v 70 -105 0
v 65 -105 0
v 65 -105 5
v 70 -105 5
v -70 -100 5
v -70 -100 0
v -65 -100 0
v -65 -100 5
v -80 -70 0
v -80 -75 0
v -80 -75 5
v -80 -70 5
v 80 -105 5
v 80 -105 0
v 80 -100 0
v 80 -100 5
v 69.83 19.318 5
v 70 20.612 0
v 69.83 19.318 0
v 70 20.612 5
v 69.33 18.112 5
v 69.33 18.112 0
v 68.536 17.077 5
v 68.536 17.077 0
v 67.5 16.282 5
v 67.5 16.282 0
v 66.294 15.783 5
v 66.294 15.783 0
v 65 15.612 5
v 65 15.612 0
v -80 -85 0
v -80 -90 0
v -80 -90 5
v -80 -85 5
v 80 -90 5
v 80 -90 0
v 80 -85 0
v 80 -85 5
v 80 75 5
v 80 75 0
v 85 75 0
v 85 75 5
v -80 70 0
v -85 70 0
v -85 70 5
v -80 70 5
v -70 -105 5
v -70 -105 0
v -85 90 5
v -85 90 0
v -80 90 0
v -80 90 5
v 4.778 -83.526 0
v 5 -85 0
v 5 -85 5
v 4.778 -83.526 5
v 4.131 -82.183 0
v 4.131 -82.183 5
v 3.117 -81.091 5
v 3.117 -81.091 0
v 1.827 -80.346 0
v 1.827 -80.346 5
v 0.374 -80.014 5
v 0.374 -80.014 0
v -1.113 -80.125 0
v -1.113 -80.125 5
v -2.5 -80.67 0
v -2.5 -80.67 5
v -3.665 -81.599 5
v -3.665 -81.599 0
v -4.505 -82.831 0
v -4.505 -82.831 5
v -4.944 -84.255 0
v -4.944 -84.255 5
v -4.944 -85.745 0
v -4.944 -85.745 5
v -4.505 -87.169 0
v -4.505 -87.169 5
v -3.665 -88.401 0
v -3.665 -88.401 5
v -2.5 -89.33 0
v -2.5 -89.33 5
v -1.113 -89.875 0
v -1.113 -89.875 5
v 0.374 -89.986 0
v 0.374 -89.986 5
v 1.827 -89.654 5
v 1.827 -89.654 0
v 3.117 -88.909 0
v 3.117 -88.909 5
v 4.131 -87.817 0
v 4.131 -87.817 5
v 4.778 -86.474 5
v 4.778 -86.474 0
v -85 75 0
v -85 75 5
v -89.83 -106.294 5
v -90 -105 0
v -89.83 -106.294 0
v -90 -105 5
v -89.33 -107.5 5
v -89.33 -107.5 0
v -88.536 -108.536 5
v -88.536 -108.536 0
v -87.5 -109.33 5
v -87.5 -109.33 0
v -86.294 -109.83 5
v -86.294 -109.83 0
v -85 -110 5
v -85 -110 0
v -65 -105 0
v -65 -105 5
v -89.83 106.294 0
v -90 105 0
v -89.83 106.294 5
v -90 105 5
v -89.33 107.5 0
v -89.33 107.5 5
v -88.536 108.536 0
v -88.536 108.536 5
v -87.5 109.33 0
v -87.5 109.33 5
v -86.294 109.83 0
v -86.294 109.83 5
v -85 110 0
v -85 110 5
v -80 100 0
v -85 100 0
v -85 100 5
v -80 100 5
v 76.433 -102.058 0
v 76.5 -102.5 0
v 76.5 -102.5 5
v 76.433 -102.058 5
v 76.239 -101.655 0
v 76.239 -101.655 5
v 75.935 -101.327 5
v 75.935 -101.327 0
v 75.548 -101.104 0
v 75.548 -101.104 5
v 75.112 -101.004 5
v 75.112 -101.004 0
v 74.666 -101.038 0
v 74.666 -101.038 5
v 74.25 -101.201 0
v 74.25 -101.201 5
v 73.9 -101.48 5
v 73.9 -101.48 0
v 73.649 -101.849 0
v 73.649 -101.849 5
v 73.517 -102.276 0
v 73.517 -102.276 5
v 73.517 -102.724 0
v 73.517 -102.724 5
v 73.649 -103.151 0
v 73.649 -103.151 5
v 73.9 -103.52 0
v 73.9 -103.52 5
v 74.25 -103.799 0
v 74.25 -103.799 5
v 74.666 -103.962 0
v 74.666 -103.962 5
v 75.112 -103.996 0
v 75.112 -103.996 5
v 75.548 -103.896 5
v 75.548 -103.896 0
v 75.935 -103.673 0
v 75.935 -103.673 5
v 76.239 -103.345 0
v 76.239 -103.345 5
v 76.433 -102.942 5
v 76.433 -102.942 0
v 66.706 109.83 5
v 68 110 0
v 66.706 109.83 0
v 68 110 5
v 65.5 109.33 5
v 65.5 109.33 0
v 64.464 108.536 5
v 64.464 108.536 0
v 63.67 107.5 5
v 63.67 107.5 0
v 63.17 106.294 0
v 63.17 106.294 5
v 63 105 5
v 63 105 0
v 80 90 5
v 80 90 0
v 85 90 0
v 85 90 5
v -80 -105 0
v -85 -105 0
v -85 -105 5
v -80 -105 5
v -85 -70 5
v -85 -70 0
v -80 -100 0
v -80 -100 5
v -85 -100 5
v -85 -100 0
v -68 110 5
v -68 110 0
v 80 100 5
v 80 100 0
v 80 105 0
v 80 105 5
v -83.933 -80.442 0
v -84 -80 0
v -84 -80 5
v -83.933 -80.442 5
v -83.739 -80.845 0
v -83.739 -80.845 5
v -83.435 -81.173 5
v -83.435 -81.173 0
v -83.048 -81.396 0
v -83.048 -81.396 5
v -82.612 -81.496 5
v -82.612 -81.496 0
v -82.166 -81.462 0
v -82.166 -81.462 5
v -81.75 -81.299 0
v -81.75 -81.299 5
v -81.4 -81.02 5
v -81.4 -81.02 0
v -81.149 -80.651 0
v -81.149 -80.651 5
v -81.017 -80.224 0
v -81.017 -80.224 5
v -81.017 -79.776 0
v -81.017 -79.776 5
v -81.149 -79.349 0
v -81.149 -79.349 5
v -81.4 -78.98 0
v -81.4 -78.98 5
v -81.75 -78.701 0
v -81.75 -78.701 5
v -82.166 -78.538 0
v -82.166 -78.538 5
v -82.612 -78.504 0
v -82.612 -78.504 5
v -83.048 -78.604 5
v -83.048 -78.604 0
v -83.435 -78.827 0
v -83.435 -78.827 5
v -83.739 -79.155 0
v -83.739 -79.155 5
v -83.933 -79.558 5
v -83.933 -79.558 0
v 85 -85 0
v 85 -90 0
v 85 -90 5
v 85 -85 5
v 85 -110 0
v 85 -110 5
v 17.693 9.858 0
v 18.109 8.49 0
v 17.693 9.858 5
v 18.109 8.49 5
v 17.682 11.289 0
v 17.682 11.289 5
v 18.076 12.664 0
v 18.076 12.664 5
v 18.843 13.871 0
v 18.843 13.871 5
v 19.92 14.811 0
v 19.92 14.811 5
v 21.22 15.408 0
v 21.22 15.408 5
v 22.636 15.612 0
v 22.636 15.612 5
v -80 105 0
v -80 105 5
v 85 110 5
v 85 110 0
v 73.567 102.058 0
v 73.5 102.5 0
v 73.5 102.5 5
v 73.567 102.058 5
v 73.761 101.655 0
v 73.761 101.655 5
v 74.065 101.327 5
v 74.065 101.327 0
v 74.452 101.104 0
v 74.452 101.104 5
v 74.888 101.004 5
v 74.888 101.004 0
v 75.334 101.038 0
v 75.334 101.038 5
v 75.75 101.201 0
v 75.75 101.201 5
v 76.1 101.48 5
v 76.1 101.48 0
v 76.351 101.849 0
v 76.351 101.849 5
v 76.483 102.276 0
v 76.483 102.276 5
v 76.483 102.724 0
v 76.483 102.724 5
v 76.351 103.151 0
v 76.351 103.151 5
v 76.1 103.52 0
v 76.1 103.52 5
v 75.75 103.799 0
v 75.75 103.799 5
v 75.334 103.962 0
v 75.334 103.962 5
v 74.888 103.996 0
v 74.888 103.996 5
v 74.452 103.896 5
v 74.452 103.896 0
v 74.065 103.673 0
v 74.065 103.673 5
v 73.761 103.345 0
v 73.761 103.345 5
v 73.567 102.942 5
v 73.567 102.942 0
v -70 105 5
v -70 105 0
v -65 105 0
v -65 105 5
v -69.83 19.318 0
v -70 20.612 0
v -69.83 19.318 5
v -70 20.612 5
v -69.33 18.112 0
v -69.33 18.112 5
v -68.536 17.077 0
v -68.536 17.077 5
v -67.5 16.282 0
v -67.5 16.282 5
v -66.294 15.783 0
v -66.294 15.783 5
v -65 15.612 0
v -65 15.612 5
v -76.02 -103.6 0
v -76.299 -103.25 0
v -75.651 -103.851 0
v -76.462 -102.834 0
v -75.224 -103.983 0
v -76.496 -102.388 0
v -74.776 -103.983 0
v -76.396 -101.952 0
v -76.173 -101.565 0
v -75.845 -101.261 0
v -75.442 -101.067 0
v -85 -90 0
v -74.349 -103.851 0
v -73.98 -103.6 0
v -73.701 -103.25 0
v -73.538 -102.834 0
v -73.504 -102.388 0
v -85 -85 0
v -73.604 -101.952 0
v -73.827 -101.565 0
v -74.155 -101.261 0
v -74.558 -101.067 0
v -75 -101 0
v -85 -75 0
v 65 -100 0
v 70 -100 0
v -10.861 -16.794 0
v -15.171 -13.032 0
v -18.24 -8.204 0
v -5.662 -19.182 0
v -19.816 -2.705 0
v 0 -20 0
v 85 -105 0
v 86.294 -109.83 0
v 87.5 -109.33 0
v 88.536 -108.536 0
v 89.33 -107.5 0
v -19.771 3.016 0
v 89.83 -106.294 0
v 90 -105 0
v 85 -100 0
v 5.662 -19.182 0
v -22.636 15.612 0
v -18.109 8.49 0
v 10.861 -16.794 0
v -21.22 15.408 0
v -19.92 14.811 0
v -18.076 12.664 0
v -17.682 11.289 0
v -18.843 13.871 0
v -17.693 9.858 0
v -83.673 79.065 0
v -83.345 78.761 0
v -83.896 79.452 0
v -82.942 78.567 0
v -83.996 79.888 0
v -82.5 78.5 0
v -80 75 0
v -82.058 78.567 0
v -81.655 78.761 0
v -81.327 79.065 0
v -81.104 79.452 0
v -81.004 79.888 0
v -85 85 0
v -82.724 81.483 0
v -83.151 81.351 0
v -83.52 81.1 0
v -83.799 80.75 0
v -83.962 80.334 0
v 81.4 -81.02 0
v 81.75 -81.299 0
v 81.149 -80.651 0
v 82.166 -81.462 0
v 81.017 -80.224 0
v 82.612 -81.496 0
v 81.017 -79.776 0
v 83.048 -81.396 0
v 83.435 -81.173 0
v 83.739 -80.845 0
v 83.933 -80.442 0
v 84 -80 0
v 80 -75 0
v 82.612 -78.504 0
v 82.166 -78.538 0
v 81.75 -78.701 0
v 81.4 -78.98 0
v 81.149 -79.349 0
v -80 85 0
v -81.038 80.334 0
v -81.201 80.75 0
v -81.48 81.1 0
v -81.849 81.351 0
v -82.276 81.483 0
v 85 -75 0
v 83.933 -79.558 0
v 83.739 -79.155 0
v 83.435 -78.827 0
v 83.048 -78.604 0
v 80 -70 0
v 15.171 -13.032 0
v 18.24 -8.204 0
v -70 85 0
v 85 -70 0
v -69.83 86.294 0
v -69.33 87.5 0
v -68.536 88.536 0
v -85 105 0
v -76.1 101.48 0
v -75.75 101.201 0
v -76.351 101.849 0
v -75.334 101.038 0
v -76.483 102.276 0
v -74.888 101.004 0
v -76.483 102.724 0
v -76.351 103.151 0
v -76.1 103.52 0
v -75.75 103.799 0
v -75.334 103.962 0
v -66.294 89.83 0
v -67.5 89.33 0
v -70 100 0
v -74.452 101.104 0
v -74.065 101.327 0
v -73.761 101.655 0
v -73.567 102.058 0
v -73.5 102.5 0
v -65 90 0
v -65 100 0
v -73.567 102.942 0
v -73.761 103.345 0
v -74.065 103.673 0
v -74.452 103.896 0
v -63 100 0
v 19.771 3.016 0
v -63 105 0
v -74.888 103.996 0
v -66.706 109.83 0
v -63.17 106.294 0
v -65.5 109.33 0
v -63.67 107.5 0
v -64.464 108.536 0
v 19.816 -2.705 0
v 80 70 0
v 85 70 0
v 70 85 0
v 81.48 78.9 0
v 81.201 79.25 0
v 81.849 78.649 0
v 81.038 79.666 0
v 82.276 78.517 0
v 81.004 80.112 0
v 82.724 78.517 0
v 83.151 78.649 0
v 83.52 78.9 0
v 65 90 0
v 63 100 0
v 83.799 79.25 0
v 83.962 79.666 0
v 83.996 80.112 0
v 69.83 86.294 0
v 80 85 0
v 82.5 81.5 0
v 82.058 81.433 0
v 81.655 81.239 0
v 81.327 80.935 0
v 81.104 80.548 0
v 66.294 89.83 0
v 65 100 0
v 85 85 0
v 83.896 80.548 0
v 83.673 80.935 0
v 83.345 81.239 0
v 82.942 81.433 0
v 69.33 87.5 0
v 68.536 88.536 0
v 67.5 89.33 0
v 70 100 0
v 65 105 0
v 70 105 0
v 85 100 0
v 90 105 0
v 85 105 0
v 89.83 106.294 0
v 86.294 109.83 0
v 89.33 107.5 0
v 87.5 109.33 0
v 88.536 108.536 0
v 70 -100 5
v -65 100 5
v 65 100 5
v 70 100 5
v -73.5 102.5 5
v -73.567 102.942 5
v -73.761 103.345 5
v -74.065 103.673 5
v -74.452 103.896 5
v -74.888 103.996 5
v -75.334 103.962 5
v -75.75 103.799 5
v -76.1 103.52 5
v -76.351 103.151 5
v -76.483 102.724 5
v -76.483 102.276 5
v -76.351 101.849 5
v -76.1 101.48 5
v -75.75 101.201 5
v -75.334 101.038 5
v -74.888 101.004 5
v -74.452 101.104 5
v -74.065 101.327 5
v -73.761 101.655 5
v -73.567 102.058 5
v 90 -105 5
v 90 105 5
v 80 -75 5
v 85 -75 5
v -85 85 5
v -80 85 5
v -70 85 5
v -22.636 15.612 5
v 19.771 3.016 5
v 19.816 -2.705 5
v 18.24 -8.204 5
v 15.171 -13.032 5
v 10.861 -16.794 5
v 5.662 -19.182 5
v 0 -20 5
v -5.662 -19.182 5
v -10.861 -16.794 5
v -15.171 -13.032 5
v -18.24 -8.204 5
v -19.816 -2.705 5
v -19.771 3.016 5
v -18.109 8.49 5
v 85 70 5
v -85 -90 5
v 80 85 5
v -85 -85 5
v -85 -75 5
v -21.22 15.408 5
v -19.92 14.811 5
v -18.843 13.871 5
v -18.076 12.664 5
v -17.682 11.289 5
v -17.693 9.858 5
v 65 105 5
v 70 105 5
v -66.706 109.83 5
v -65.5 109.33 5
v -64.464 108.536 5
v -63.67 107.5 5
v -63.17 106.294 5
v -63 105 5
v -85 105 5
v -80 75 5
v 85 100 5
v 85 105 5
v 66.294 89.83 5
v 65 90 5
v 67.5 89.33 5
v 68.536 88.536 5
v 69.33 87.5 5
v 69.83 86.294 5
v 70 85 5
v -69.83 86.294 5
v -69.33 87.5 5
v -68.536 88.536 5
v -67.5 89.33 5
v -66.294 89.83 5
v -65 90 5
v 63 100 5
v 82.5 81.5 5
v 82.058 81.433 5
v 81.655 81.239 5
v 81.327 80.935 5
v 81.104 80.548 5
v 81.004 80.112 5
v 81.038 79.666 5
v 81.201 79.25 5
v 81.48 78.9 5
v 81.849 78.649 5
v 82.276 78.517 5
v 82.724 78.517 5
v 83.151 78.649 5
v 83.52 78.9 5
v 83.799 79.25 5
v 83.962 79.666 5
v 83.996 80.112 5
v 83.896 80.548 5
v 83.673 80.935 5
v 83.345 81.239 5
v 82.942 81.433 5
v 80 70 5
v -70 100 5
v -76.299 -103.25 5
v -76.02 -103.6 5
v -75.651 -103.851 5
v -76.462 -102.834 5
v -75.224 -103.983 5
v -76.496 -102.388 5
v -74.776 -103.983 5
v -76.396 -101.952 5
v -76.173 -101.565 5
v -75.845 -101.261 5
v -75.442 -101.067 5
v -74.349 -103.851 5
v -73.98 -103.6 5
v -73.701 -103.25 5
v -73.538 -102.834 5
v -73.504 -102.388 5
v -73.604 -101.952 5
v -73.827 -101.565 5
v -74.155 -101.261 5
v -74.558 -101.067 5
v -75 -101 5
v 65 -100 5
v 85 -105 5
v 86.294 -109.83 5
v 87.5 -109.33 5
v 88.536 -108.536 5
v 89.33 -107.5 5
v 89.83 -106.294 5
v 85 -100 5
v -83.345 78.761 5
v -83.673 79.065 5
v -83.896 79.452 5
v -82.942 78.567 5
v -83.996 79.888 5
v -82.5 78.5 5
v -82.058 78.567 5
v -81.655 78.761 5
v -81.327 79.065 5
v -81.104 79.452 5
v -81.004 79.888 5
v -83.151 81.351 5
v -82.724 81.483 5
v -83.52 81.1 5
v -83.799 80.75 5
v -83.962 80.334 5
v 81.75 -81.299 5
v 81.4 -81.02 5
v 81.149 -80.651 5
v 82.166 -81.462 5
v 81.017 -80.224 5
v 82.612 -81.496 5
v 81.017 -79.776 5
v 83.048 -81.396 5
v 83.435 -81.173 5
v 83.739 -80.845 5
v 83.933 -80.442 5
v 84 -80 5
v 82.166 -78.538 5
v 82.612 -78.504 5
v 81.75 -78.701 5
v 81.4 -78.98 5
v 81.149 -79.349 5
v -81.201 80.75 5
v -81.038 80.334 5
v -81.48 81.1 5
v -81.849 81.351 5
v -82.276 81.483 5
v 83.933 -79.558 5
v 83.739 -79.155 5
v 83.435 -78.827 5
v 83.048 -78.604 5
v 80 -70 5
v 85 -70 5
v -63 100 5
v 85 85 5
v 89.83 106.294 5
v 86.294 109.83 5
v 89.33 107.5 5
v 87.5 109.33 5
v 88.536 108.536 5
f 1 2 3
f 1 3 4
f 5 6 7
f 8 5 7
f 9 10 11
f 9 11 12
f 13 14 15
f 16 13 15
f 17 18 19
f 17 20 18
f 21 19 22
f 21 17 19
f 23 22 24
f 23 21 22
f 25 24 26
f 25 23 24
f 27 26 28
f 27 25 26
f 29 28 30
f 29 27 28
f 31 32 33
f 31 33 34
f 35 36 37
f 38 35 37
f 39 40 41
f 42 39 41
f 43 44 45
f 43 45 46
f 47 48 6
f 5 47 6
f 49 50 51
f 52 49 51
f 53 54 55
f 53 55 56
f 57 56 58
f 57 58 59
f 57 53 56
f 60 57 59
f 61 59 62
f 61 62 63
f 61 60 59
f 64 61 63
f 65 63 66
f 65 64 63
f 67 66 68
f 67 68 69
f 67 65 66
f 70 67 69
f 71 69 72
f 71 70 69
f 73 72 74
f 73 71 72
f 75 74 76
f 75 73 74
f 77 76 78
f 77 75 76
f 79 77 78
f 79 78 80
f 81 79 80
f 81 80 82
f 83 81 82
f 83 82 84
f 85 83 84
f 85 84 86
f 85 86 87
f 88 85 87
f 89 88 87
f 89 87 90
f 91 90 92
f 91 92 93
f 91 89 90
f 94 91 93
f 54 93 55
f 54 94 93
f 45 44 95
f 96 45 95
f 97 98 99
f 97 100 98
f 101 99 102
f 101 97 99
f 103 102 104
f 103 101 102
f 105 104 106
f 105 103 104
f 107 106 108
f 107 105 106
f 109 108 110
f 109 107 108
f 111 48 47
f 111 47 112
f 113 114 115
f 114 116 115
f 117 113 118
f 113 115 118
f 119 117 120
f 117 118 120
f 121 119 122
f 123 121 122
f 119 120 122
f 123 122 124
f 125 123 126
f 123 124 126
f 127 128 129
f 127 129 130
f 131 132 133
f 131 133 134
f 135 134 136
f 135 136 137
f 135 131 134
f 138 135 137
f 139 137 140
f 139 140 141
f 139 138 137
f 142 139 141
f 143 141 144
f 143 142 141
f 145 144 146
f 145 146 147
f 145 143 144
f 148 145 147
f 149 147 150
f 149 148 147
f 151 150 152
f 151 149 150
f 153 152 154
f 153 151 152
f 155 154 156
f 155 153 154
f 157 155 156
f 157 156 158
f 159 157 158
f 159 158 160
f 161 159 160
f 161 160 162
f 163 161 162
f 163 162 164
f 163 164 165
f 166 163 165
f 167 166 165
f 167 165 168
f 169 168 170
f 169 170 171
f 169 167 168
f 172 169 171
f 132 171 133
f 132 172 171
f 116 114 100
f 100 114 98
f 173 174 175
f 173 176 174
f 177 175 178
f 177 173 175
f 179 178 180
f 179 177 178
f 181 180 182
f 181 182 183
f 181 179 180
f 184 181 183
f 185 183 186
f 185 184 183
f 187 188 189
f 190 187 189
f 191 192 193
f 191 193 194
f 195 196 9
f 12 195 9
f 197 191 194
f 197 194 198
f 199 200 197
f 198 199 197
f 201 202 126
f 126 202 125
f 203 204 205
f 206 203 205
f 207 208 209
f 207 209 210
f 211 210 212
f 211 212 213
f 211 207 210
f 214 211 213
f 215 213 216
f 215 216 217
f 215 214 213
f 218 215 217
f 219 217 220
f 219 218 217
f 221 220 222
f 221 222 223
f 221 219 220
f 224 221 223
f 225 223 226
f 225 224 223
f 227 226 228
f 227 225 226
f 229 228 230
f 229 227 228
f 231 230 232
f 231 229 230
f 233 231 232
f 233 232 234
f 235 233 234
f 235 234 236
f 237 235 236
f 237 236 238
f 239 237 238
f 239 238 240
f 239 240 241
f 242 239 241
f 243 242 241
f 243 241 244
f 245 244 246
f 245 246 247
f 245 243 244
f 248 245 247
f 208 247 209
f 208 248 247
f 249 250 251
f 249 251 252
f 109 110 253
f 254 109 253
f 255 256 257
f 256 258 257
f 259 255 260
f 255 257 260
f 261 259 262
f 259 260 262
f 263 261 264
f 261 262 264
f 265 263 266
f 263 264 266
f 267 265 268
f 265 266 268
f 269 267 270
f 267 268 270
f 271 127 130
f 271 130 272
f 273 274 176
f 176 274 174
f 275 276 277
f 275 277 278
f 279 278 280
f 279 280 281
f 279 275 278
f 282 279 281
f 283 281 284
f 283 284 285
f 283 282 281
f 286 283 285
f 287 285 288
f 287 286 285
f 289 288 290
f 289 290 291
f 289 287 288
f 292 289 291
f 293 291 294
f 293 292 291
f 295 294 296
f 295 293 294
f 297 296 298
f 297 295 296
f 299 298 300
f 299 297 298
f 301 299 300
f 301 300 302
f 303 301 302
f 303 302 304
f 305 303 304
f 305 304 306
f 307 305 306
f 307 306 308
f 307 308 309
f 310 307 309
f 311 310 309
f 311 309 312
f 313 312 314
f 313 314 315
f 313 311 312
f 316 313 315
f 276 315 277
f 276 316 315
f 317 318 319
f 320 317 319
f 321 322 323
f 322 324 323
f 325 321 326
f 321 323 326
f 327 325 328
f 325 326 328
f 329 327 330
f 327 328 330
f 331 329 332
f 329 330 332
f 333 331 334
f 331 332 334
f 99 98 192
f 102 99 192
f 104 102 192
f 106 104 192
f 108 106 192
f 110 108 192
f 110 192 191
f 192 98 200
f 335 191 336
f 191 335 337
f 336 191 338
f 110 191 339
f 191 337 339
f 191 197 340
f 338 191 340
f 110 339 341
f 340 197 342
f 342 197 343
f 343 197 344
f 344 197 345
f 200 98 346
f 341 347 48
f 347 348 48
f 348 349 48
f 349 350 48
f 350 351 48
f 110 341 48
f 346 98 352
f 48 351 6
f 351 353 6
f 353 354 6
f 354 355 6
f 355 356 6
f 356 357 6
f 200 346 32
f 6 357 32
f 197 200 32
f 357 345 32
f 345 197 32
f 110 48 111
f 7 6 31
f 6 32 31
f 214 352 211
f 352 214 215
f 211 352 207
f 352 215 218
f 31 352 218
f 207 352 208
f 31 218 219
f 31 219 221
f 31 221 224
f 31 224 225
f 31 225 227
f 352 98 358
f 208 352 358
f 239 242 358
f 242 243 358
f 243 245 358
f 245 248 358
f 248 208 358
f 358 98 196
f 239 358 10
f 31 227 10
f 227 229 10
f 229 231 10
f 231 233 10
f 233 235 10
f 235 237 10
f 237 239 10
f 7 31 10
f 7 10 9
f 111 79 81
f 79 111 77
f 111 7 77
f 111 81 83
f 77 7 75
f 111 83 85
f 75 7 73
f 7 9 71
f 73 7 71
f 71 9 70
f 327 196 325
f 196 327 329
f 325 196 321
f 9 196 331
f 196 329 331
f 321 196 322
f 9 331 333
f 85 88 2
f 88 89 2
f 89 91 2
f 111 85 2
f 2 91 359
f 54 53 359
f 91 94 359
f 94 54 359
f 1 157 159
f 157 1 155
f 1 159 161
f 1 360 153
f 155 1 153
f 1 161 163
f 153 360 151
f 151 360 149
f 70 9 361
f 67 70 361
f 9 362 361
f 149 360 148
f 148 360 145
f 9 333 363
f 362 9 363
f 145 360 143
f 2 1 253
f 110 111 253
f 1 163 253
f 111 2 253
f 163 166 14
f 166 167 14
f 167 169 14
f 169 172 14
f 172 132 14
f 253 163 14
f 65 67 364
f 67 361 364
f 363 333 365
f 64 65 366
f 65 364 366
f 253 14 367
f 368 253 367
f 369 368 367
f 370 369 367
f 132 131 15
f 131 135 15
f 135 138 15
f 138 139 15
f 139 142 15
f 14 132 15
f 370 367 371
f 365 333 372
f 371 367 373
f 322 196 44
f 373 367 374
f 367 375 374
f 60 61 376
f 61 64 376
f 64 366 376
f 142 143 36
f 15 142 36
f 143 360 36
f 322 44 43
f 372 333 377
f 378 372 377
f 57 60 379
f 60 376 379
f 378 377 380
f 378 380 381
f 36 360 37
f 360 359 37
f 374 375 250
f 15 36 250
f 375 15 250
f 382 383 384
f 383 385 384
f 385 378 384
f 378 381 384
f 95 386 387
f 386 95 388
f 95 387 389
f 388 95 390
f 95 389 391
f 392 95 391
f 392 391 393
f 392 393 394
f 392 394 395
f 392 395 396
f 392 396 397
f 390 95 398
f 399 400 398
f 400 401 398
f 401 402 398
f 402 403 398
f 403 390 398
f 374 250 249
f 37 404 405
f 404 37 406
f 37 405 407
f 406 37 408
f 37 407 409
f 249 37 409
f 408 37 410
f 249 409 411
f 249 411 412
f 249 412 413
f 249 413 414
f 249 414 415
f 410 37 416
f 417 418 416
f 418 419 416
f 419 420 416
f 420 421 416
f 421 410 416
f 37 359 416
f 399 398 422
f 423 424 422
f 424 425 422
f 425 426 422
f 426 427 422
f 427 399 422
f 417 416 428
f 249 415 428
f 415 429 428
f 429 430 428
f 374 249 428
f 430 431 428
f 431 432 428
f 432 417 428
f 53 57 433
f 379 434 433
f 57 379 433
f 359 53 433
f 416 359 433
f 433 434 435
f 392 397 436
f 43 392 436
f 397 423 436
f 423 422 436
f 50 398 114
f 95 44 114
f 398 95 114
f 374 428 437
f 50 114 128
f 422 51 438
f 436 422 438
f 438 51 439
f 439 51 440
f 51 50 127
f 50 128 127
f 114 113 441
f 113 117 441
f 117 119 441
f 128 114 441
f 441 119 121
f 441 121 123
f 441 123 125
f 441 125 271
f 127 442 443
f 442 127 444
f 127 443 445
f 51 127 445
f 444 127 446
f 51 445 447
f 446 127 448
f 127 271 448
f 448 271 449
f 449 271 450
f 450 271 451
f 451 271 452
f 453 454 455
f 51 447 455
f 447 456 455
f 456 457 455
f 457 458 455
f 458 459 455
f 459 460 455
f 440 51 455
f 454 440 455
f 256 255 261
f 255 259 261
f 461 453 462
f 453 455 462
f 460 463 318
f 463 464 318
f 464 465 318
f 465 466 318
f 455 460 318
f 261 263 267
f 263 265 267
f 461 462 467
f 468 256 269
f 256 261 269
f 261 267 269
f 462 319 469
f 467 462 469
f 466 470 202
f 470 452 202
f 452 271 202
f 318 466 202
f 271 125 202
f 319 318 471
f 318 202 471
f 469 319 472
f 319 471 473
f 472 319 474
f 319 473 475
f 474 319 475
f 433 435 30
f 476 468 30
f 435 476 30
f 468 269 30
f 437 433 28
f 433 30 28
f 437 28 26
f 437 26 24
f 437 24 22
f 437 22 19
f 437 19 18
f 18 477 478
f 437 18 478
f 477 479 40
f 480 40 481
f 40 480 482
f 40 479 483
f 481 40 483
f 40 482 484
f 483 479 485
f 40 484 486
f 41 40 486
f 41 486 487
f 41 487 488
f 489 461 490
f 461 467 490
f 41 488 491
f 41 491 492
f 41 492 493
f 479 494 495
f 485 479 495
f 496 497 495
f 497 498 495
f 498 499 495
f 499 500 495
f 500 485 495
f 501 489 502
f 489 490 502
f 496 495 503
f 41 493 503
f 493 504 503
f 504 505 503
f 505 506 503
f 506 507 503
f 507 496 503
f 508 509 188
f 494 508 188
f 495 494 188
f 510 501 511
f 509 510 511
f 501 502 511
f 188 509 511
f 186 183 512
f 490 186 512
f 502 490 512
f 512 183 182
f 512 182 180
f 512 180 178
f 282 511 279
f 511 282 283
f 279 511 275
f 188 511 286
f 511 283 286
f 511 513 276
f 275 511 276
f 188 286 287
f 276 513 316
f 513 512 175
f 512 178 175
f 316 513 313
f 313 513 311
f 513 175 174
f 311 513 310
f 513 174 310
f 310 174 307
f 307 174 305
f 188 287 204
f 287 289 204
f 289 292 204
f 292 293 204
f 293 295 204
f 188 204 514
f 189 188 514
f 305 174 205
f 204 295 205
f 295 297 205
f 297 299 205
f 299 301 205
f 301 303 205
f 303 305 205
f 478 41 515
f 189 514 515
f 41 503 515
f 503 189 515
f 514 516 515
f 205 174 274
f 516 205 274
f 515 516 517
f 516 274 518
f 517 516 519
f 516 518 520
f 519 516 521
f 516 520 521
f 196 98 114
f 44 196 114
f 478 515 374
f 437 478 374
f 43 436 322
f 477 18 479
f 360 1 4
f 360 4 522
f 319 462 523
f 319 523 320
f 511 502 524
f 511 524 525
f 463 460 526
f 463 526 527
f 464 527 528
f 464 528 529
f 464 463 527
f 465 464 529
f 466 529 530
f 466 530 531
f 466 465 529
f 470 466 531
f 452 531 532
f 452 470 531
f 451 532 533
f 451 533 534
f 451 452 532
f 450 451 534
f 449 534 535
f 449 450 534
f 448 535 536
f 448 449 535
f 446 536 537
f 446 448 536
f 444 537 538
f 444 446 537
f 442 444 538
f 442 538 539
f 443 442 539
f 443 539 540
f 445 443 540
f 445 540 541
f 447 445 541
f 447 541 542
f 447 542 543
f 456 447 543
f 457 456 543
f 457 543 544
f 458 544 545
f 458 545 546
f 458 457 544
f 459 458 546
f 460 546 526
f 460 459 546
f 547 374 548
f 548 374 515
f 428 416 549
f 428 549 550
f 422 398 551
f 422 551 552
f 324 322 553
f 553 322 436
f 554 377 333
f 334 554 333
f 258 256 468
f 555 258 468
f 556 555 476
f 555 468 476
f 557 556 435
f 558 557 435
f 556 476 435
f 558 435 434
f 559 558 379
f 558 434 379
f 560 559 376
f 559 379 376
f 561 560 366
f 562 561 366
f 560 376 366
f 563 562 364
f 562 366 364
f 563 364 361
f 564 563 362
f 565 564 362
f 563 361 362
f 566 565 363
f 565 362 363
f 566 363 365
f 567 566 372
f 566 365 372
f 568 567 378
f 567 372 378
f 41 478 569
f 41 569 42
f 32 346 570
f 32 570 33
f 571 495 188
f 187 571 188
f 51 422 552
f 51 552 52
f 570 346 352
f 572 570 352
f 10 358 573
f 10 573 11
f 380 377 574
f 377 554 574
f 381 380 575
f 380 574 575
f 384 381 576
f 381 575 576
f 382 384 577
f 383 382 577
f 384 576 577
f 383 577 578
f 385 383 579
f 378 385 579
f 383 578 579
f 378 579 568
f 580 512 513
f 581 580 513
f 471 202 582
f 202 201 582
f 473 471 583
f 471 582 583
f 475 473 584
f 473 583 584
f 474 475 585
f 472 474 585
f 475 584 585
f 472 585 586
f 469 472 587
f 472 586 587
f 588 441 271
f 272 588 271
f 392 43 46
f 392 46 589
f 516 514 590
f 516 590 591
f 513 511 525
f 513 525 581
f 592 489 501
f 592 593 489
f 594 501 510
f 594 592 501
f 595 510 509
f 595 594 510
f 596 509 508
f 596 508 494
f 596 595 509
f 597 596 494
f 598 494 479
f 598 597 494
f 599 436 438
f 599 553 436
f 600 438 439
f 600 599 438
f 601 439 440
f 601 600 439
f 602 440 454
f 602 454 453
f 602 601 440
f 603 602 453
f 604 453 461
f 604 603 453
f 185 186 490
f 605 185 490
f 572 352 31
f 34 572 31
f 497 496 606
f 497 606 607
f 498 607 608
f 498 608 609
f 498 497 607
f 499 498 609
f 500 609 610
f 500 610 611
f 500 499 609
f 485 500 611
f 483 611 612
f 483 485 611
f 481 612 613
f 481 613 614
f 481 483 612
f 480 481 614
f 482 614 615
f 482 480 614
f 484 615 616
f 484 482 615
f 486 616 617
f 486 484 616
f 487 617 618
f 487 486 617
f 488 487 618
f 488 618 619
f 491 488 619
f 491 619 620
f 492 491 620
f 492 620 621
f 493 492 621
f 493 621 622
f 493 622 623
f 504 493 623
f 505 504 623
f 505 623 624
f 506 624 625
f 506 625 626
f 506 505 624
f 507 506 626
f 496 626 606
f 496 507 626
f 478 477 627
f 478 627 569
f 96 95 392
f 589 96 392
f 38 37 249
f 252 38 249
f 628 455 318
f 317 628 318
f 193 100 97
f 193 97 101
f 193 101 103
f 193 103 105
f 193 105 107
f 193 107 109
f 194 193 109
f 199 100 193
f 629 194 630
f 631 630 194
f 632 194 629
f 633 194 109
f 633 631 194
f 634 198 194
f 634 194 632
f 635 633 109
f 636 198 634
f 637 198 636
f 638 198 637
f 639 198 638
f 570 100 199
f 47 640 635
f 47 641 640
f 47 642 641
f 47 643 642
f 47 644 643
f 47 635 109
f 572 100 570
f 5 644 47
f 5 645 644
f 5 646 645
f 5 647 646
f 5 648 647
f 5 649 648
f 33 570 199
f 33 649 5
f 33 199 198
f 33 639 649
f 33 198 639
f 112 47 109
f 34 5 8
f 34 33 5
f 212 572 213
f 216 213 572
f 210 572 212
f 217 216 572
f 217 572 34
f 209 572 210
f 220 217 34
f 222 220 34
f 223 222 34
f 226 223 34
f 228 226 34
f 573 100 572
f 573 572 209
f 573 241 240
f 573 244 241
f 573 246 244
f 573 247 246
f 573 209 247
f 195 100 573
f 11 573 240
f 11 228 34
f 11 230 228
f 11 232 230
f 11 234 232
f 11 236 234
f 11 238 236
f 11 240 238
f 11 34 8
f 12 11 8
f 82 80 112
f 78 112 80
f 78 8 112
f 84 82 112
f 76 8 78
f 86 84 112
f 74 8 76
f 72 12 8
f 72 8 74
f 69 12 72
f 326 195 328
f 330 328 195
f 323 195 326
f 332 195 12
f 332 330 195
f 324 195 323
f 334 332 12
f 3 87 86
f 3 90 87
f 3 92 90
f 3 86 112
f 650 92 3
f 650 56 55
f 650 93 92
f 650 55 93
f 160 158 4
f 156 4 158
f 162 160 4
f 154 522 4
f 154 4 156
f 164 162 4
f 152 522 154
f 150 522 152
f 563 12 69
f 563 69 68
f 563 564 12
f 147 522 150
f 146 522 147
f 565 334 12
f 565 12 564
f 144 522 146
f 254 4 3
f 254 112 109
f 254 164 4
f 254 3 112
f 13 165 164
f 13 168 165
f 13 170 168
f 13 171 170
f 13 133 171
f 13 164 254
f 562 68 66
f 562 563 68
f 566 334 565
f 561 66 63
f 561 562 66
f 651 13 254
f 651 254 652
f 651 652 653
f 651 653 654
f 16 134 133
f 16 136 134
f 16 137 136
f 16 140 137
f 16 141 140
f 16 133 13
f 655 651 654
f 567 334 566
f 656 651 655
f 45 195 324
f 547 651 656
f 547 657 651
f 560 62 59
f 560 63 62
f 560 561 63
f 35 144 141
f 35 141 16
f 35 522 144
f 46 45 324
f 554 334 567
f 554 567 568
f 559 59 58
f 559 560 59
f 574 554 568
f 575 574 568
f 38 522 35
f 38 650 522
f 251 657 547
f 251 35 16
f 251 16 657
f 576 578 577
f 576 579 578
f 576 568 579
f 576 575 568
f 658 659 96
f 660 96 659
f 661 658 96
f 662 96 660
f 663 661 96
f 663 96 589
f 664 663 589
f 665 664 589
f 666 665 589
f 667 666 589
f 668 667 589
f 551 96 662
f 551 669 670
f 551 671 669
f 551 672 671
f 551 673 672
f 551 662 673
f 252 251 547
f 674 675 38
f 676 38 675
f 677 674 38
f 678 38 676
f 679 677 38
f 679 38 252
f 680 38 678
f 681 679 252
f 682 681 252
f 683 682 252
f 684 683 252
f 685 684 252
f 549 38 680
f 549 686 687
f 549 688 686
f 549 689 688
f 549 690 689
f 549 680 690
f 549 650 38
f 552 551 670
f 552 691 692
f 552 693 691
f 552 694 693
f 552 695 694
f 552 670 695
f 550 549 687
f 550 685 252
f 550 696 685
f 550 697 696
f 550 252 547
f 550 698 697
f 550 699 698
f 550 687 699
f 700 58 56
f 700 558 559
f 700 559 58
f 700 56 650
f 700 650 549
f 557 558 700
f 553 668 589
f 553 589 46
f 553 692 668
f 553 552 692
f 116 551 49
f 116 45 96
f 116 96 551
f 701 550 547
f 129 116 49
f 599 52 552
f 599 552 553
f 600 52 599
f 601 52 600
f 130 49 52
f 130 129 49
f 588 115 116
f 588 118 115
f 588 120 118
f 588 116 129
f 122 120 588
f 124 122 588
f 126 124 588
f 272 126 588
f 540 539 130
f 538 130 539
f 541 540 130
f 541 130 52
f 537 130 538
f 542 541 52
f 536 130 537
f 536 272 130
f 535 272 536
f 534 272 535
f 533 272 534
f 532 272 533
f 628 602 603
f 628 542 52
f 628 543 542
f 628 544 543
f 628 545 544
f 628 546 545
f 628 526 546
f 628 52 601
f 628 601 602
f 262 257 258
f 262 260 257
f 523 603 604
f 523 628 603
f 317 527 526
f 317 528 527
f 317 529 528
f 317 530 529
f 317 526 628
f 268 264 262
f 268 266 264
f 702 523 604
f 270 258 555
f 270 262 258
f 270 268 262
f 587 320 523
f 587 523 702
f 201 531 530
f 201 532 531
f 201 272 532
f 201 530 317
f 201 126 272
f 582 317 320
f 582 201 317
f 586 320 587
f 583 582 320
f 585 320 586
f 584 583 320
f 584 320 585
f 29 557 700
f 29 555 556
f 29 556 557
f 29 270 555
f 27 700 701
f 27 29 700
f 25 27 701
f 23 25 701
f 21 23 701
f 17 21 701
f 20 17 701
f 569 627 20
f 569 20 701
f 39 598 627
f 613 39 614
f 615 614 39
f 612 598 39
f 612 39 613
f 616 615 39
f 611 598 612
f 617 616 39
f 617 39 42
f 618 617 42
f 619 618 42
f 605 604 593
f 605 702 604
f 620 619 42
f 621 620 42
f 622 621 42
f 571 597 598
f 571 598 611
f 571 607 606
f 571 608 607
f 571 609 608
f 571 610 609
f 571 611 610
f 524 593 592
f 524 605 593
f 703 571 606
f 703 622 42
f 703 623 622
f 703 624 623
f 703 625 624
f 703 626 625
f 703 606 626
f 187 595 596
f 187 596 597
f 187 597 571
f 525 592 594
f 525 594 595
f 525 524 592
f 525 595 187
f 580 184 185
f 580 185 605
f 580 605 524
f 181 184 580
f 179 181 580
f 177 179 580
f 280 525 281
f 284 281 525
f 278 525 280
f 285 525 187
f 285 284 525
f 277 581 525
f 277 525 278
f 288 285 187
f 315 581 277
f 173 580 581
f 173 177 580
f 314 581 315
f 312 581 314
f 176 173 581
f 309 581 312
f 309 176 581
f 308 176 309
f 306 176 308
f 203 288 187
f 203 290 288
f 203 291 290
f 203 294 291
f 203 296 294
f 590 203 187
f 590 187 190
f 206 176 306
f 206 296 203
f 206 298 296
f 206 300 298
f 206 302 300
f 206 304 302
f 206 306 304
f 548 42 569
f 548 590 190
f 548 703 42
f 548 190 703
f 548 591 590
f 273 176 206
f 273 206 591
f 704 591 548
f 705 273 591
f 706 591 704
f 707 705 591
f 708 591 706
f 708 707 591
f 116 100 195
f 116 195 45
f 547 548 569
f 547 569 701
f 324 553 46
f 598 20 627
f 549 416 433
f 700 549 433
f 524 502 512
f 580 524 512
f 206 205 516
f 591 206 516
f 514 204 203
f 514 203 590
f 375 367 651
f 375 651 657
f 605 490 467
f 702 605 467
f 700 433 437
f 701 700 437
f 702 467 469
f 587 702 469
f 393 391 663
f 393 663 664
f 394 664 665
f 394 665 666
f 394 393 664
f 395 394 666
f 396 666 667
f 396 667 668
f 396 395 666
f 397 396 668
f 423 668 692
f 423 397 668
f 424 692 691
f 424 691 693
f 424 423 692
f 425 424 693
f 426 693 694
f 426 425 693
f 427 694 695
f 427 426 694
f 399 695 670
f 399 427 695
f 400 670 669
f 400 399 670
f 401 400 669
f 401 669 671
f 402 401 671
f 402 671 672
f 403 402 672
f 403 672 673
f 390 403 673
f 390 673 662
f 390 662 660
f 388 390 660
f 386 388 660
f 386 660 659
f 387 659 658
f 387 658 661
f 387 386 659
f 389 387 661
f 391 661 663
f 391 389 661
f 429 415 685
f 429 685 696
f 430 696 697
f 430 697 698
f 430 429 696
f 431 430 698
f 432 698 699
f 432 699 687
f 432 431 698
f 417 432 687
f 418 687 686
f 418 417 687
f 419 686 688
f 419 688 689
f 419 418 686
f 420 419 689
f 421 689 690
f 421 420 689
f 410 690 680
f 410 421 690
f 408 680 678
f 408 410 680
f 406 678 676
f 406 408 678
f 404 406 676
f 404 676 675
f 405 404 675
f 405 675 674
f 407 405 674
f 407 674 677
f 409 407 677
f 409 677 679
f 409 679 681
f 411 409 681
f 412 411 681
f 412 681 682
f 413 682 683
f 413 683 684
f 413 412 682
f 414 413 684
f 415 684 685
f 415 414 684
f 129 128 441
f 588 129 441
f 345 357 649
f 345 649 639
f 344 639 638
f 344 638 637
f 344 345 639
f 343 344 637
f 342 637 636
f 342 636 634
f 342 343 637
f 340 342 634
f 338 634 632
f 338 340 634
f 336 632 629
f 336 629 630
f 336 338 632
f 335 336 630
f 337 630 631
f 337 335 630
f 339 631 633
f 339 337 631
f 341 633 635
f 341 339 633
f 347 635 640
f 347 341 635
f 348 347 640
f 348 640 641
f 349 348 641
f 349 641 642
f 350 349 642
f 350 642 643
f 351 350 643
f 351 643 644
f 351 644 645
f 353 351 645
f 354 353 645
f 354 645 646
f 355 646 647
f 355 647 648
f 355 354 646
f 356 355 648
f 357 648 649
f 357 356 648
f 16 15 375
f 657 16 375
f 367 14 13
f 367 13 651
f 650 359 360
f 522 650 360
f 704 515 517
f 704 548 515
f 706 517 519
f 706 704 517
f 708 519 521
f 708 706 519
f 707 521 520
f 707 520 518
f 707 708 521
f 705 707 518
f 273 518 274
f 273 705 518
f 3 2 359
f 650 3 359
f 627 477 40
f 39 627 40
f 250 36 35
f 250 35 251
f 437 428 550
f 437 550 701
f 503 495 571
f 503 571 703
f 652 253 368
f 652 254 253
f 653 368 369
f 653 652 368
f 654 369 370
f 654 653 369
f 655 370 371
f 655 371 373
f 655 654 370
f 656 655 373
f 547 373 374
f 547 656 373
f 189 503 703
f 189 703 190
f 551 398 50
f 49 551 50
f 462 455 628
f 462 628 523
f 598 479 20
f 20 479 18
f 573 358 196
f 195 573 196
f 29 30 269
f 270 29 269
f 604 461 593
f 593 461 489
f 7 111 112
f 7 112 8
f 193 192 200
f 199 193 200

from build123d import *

# Parameters (mm, degrees)
SKETCH1_R           = 5
SKETCH1_R_2         = 1.5
SKETCH1_W           = 5
SKETCH1_H           = 5
BOSS_EXTRUDE1_DEPTH = 5
FILLET1_R           = 5


with BuildPart() as part:
    # Sketch1 → Boss-Extrude1 (new body)
    with BuildSketch(Plane.XY):
        Polygon((-90, 110), (-90, -110), (90, -110), (90, 110), (63, 110), (63, 100), (-63, 100), (-63, 110), align=None)
        with Locations((0, -85)):
            Circle(SKETCH1_R, mode=Mode.SUBTRACT)
        with Locations((-75, 102.5)):
            Circle(SKETCH1_R_2, mode=Mode.SUBTRACT)
        with Locations(Location((-75, -102.5, 0), (0, 0, 90))):
            Circle(SKETCH1_R_2, mode=Mode.SUBTRACT)
        with Locations((75, -102.5)):
            Circle(SKETCH1_R_2, mode=Mode.SUBTRACT)
        with Locations(Location((75, 102.5, 0), (0, 0, 180))):
            Circle(SKETCH1_R_2, mode=Mode.SUBTRACT)
        with Locations(Location((82.5, 80, 0), (0, 0, 90))):
            Circle(SKETCH1_R_2, mode=Mode.SUBTRACT)
        with Locations((82.5, -80)):
            Circle(SKETCH1_R_2, mode=Mode.SUBTRACT)
        with Locations(Location((-82.5, 80, 0), (0, 0, 270))):
            Circle(SKETCH1_R_2, mode=Mode.SUBTRACT)
        with Locations(Location((-82.5, -80, 0), (0, 0, 180))):
            Circle(SKETCH1_R_2, mode=Mode.SUBTRACT)
        with BuildLine():
            Line((-70, 90), (70, 90))
            Line((70, 90), (70, 15.612494996))
            Line((70, 15.612494996), (12.5, 15.612494996))
            ThreePointArc((12.5, 15.612494996), (0, -20), (-12.5, 15.612494996))
            Line((-12.5, 15.612494996), (-70, 15.612494996))
            Line((-70, 15.612494996), (-70, 90))
        make_face(mode=Mode.SUBTRACT)
        with Locations((-82.5, 102.5)):
            Rectangle(SKETCH1_W, SKETCH1_H, mode=Mode.SUBTRACT)
        with Locations((-67.5, 102.5)):
            Rectangle(SKETCH1_W, SKETCH1_H, mode=Mode.SUBTRACT)
        with Locations((-82.5, -102.5)):
            Rectangle(SKETCH1_W, SKETCH1_H, mode=Mode.SUBTRACT)
        with Locations((-67.5, -102.5)):
            Rectangle(SKETCH1_W, SKETCH1_H, mode=Mode.SUBTRACT)
        with Locations((82.5, -102.5)):
            Rectangle(SKETCH1_W, SKETCH1_H, mode=Mode.SUBTRACT)
        with Locations((67.5, -102.5)):
            Rectangle(SKETCH1_W, SKETCH1_H, mode=Mode.SUBTRACT)
        with Locations((82.5, 102.5)):
            Rectangle(SKETCH1_W, SKETCH1_H, mode=Mode.SUBTRACT)
        with Locations((67.5, 102.5)):
            Rectangle(SKETCH1_W, SKETCH1_H, mode=Mode.SUBTRACT)
        with Locations((82.5, 87.5)):
            Rectangle(SKETCH1_W, SKETCH1_H, mode=Mode.SUBTRACT)
        with Locations((82.5, 72.5)):
            Rectangle(SKETCH1_W, SKETCH1_H, mode=Mode.SUBTRACT)
        with Locations((82.5, -87.5)):
            Rectangle(SKETCH1_W, SKETCH1_H, mode=Mode.SUBTRACT)
        with Locations((82.5, -72.5)):
            Rectangle(SKETCH1_W, SKETCH1_H, mode=Mode.SUBTRACT)
        with Locations((-82.5, 87.5)):
            Rectangle(SKETCH1_W, SKETCH1_H, mode=Mode.SUBTRACT)
        with Locations((-82.5, 72.5)):
            Rectangle(SKETCH1_W, SKETCH1_H, mode=Mode.SUBTRACT)
        with Locations((-82.5, -87.5)):
            Rectangle(SKETCH1_W, SKETCH1_H, mode=Mode.SUBTRACT)
        with Locations((-82.5, -72.5)):
            Rectangle(SKETCH1_W, SKETCH1_H, mode=Mode.SUBTRACT)
    extrude(amount=BOSS_EXTRUDE1_DEPTH)

    # Fillet1
    fillet1_edges = [part.edges().sort_by_distance(p)[0] for p in [
        (-63, 110, 2.5),
        (63, 110, 2.5),
        (90, 110, 2.5),
        (90, -110, 2.5),
        (-90, -110, 2.5),
        (-90, 110, 2.5),
        (-12.5, 15.612494996, 2.5),
        (12.5, 15.612494996, 2.5),
        (70, 15.612494996, 2.5),
        (70, 90, 2.5),
        (-70, 90, 2.5),
        (-70, 15.612494996, 2.5),
    ]]
    fillet(fillet1_edges, radius=FILLET1_R)


solid = part.part
